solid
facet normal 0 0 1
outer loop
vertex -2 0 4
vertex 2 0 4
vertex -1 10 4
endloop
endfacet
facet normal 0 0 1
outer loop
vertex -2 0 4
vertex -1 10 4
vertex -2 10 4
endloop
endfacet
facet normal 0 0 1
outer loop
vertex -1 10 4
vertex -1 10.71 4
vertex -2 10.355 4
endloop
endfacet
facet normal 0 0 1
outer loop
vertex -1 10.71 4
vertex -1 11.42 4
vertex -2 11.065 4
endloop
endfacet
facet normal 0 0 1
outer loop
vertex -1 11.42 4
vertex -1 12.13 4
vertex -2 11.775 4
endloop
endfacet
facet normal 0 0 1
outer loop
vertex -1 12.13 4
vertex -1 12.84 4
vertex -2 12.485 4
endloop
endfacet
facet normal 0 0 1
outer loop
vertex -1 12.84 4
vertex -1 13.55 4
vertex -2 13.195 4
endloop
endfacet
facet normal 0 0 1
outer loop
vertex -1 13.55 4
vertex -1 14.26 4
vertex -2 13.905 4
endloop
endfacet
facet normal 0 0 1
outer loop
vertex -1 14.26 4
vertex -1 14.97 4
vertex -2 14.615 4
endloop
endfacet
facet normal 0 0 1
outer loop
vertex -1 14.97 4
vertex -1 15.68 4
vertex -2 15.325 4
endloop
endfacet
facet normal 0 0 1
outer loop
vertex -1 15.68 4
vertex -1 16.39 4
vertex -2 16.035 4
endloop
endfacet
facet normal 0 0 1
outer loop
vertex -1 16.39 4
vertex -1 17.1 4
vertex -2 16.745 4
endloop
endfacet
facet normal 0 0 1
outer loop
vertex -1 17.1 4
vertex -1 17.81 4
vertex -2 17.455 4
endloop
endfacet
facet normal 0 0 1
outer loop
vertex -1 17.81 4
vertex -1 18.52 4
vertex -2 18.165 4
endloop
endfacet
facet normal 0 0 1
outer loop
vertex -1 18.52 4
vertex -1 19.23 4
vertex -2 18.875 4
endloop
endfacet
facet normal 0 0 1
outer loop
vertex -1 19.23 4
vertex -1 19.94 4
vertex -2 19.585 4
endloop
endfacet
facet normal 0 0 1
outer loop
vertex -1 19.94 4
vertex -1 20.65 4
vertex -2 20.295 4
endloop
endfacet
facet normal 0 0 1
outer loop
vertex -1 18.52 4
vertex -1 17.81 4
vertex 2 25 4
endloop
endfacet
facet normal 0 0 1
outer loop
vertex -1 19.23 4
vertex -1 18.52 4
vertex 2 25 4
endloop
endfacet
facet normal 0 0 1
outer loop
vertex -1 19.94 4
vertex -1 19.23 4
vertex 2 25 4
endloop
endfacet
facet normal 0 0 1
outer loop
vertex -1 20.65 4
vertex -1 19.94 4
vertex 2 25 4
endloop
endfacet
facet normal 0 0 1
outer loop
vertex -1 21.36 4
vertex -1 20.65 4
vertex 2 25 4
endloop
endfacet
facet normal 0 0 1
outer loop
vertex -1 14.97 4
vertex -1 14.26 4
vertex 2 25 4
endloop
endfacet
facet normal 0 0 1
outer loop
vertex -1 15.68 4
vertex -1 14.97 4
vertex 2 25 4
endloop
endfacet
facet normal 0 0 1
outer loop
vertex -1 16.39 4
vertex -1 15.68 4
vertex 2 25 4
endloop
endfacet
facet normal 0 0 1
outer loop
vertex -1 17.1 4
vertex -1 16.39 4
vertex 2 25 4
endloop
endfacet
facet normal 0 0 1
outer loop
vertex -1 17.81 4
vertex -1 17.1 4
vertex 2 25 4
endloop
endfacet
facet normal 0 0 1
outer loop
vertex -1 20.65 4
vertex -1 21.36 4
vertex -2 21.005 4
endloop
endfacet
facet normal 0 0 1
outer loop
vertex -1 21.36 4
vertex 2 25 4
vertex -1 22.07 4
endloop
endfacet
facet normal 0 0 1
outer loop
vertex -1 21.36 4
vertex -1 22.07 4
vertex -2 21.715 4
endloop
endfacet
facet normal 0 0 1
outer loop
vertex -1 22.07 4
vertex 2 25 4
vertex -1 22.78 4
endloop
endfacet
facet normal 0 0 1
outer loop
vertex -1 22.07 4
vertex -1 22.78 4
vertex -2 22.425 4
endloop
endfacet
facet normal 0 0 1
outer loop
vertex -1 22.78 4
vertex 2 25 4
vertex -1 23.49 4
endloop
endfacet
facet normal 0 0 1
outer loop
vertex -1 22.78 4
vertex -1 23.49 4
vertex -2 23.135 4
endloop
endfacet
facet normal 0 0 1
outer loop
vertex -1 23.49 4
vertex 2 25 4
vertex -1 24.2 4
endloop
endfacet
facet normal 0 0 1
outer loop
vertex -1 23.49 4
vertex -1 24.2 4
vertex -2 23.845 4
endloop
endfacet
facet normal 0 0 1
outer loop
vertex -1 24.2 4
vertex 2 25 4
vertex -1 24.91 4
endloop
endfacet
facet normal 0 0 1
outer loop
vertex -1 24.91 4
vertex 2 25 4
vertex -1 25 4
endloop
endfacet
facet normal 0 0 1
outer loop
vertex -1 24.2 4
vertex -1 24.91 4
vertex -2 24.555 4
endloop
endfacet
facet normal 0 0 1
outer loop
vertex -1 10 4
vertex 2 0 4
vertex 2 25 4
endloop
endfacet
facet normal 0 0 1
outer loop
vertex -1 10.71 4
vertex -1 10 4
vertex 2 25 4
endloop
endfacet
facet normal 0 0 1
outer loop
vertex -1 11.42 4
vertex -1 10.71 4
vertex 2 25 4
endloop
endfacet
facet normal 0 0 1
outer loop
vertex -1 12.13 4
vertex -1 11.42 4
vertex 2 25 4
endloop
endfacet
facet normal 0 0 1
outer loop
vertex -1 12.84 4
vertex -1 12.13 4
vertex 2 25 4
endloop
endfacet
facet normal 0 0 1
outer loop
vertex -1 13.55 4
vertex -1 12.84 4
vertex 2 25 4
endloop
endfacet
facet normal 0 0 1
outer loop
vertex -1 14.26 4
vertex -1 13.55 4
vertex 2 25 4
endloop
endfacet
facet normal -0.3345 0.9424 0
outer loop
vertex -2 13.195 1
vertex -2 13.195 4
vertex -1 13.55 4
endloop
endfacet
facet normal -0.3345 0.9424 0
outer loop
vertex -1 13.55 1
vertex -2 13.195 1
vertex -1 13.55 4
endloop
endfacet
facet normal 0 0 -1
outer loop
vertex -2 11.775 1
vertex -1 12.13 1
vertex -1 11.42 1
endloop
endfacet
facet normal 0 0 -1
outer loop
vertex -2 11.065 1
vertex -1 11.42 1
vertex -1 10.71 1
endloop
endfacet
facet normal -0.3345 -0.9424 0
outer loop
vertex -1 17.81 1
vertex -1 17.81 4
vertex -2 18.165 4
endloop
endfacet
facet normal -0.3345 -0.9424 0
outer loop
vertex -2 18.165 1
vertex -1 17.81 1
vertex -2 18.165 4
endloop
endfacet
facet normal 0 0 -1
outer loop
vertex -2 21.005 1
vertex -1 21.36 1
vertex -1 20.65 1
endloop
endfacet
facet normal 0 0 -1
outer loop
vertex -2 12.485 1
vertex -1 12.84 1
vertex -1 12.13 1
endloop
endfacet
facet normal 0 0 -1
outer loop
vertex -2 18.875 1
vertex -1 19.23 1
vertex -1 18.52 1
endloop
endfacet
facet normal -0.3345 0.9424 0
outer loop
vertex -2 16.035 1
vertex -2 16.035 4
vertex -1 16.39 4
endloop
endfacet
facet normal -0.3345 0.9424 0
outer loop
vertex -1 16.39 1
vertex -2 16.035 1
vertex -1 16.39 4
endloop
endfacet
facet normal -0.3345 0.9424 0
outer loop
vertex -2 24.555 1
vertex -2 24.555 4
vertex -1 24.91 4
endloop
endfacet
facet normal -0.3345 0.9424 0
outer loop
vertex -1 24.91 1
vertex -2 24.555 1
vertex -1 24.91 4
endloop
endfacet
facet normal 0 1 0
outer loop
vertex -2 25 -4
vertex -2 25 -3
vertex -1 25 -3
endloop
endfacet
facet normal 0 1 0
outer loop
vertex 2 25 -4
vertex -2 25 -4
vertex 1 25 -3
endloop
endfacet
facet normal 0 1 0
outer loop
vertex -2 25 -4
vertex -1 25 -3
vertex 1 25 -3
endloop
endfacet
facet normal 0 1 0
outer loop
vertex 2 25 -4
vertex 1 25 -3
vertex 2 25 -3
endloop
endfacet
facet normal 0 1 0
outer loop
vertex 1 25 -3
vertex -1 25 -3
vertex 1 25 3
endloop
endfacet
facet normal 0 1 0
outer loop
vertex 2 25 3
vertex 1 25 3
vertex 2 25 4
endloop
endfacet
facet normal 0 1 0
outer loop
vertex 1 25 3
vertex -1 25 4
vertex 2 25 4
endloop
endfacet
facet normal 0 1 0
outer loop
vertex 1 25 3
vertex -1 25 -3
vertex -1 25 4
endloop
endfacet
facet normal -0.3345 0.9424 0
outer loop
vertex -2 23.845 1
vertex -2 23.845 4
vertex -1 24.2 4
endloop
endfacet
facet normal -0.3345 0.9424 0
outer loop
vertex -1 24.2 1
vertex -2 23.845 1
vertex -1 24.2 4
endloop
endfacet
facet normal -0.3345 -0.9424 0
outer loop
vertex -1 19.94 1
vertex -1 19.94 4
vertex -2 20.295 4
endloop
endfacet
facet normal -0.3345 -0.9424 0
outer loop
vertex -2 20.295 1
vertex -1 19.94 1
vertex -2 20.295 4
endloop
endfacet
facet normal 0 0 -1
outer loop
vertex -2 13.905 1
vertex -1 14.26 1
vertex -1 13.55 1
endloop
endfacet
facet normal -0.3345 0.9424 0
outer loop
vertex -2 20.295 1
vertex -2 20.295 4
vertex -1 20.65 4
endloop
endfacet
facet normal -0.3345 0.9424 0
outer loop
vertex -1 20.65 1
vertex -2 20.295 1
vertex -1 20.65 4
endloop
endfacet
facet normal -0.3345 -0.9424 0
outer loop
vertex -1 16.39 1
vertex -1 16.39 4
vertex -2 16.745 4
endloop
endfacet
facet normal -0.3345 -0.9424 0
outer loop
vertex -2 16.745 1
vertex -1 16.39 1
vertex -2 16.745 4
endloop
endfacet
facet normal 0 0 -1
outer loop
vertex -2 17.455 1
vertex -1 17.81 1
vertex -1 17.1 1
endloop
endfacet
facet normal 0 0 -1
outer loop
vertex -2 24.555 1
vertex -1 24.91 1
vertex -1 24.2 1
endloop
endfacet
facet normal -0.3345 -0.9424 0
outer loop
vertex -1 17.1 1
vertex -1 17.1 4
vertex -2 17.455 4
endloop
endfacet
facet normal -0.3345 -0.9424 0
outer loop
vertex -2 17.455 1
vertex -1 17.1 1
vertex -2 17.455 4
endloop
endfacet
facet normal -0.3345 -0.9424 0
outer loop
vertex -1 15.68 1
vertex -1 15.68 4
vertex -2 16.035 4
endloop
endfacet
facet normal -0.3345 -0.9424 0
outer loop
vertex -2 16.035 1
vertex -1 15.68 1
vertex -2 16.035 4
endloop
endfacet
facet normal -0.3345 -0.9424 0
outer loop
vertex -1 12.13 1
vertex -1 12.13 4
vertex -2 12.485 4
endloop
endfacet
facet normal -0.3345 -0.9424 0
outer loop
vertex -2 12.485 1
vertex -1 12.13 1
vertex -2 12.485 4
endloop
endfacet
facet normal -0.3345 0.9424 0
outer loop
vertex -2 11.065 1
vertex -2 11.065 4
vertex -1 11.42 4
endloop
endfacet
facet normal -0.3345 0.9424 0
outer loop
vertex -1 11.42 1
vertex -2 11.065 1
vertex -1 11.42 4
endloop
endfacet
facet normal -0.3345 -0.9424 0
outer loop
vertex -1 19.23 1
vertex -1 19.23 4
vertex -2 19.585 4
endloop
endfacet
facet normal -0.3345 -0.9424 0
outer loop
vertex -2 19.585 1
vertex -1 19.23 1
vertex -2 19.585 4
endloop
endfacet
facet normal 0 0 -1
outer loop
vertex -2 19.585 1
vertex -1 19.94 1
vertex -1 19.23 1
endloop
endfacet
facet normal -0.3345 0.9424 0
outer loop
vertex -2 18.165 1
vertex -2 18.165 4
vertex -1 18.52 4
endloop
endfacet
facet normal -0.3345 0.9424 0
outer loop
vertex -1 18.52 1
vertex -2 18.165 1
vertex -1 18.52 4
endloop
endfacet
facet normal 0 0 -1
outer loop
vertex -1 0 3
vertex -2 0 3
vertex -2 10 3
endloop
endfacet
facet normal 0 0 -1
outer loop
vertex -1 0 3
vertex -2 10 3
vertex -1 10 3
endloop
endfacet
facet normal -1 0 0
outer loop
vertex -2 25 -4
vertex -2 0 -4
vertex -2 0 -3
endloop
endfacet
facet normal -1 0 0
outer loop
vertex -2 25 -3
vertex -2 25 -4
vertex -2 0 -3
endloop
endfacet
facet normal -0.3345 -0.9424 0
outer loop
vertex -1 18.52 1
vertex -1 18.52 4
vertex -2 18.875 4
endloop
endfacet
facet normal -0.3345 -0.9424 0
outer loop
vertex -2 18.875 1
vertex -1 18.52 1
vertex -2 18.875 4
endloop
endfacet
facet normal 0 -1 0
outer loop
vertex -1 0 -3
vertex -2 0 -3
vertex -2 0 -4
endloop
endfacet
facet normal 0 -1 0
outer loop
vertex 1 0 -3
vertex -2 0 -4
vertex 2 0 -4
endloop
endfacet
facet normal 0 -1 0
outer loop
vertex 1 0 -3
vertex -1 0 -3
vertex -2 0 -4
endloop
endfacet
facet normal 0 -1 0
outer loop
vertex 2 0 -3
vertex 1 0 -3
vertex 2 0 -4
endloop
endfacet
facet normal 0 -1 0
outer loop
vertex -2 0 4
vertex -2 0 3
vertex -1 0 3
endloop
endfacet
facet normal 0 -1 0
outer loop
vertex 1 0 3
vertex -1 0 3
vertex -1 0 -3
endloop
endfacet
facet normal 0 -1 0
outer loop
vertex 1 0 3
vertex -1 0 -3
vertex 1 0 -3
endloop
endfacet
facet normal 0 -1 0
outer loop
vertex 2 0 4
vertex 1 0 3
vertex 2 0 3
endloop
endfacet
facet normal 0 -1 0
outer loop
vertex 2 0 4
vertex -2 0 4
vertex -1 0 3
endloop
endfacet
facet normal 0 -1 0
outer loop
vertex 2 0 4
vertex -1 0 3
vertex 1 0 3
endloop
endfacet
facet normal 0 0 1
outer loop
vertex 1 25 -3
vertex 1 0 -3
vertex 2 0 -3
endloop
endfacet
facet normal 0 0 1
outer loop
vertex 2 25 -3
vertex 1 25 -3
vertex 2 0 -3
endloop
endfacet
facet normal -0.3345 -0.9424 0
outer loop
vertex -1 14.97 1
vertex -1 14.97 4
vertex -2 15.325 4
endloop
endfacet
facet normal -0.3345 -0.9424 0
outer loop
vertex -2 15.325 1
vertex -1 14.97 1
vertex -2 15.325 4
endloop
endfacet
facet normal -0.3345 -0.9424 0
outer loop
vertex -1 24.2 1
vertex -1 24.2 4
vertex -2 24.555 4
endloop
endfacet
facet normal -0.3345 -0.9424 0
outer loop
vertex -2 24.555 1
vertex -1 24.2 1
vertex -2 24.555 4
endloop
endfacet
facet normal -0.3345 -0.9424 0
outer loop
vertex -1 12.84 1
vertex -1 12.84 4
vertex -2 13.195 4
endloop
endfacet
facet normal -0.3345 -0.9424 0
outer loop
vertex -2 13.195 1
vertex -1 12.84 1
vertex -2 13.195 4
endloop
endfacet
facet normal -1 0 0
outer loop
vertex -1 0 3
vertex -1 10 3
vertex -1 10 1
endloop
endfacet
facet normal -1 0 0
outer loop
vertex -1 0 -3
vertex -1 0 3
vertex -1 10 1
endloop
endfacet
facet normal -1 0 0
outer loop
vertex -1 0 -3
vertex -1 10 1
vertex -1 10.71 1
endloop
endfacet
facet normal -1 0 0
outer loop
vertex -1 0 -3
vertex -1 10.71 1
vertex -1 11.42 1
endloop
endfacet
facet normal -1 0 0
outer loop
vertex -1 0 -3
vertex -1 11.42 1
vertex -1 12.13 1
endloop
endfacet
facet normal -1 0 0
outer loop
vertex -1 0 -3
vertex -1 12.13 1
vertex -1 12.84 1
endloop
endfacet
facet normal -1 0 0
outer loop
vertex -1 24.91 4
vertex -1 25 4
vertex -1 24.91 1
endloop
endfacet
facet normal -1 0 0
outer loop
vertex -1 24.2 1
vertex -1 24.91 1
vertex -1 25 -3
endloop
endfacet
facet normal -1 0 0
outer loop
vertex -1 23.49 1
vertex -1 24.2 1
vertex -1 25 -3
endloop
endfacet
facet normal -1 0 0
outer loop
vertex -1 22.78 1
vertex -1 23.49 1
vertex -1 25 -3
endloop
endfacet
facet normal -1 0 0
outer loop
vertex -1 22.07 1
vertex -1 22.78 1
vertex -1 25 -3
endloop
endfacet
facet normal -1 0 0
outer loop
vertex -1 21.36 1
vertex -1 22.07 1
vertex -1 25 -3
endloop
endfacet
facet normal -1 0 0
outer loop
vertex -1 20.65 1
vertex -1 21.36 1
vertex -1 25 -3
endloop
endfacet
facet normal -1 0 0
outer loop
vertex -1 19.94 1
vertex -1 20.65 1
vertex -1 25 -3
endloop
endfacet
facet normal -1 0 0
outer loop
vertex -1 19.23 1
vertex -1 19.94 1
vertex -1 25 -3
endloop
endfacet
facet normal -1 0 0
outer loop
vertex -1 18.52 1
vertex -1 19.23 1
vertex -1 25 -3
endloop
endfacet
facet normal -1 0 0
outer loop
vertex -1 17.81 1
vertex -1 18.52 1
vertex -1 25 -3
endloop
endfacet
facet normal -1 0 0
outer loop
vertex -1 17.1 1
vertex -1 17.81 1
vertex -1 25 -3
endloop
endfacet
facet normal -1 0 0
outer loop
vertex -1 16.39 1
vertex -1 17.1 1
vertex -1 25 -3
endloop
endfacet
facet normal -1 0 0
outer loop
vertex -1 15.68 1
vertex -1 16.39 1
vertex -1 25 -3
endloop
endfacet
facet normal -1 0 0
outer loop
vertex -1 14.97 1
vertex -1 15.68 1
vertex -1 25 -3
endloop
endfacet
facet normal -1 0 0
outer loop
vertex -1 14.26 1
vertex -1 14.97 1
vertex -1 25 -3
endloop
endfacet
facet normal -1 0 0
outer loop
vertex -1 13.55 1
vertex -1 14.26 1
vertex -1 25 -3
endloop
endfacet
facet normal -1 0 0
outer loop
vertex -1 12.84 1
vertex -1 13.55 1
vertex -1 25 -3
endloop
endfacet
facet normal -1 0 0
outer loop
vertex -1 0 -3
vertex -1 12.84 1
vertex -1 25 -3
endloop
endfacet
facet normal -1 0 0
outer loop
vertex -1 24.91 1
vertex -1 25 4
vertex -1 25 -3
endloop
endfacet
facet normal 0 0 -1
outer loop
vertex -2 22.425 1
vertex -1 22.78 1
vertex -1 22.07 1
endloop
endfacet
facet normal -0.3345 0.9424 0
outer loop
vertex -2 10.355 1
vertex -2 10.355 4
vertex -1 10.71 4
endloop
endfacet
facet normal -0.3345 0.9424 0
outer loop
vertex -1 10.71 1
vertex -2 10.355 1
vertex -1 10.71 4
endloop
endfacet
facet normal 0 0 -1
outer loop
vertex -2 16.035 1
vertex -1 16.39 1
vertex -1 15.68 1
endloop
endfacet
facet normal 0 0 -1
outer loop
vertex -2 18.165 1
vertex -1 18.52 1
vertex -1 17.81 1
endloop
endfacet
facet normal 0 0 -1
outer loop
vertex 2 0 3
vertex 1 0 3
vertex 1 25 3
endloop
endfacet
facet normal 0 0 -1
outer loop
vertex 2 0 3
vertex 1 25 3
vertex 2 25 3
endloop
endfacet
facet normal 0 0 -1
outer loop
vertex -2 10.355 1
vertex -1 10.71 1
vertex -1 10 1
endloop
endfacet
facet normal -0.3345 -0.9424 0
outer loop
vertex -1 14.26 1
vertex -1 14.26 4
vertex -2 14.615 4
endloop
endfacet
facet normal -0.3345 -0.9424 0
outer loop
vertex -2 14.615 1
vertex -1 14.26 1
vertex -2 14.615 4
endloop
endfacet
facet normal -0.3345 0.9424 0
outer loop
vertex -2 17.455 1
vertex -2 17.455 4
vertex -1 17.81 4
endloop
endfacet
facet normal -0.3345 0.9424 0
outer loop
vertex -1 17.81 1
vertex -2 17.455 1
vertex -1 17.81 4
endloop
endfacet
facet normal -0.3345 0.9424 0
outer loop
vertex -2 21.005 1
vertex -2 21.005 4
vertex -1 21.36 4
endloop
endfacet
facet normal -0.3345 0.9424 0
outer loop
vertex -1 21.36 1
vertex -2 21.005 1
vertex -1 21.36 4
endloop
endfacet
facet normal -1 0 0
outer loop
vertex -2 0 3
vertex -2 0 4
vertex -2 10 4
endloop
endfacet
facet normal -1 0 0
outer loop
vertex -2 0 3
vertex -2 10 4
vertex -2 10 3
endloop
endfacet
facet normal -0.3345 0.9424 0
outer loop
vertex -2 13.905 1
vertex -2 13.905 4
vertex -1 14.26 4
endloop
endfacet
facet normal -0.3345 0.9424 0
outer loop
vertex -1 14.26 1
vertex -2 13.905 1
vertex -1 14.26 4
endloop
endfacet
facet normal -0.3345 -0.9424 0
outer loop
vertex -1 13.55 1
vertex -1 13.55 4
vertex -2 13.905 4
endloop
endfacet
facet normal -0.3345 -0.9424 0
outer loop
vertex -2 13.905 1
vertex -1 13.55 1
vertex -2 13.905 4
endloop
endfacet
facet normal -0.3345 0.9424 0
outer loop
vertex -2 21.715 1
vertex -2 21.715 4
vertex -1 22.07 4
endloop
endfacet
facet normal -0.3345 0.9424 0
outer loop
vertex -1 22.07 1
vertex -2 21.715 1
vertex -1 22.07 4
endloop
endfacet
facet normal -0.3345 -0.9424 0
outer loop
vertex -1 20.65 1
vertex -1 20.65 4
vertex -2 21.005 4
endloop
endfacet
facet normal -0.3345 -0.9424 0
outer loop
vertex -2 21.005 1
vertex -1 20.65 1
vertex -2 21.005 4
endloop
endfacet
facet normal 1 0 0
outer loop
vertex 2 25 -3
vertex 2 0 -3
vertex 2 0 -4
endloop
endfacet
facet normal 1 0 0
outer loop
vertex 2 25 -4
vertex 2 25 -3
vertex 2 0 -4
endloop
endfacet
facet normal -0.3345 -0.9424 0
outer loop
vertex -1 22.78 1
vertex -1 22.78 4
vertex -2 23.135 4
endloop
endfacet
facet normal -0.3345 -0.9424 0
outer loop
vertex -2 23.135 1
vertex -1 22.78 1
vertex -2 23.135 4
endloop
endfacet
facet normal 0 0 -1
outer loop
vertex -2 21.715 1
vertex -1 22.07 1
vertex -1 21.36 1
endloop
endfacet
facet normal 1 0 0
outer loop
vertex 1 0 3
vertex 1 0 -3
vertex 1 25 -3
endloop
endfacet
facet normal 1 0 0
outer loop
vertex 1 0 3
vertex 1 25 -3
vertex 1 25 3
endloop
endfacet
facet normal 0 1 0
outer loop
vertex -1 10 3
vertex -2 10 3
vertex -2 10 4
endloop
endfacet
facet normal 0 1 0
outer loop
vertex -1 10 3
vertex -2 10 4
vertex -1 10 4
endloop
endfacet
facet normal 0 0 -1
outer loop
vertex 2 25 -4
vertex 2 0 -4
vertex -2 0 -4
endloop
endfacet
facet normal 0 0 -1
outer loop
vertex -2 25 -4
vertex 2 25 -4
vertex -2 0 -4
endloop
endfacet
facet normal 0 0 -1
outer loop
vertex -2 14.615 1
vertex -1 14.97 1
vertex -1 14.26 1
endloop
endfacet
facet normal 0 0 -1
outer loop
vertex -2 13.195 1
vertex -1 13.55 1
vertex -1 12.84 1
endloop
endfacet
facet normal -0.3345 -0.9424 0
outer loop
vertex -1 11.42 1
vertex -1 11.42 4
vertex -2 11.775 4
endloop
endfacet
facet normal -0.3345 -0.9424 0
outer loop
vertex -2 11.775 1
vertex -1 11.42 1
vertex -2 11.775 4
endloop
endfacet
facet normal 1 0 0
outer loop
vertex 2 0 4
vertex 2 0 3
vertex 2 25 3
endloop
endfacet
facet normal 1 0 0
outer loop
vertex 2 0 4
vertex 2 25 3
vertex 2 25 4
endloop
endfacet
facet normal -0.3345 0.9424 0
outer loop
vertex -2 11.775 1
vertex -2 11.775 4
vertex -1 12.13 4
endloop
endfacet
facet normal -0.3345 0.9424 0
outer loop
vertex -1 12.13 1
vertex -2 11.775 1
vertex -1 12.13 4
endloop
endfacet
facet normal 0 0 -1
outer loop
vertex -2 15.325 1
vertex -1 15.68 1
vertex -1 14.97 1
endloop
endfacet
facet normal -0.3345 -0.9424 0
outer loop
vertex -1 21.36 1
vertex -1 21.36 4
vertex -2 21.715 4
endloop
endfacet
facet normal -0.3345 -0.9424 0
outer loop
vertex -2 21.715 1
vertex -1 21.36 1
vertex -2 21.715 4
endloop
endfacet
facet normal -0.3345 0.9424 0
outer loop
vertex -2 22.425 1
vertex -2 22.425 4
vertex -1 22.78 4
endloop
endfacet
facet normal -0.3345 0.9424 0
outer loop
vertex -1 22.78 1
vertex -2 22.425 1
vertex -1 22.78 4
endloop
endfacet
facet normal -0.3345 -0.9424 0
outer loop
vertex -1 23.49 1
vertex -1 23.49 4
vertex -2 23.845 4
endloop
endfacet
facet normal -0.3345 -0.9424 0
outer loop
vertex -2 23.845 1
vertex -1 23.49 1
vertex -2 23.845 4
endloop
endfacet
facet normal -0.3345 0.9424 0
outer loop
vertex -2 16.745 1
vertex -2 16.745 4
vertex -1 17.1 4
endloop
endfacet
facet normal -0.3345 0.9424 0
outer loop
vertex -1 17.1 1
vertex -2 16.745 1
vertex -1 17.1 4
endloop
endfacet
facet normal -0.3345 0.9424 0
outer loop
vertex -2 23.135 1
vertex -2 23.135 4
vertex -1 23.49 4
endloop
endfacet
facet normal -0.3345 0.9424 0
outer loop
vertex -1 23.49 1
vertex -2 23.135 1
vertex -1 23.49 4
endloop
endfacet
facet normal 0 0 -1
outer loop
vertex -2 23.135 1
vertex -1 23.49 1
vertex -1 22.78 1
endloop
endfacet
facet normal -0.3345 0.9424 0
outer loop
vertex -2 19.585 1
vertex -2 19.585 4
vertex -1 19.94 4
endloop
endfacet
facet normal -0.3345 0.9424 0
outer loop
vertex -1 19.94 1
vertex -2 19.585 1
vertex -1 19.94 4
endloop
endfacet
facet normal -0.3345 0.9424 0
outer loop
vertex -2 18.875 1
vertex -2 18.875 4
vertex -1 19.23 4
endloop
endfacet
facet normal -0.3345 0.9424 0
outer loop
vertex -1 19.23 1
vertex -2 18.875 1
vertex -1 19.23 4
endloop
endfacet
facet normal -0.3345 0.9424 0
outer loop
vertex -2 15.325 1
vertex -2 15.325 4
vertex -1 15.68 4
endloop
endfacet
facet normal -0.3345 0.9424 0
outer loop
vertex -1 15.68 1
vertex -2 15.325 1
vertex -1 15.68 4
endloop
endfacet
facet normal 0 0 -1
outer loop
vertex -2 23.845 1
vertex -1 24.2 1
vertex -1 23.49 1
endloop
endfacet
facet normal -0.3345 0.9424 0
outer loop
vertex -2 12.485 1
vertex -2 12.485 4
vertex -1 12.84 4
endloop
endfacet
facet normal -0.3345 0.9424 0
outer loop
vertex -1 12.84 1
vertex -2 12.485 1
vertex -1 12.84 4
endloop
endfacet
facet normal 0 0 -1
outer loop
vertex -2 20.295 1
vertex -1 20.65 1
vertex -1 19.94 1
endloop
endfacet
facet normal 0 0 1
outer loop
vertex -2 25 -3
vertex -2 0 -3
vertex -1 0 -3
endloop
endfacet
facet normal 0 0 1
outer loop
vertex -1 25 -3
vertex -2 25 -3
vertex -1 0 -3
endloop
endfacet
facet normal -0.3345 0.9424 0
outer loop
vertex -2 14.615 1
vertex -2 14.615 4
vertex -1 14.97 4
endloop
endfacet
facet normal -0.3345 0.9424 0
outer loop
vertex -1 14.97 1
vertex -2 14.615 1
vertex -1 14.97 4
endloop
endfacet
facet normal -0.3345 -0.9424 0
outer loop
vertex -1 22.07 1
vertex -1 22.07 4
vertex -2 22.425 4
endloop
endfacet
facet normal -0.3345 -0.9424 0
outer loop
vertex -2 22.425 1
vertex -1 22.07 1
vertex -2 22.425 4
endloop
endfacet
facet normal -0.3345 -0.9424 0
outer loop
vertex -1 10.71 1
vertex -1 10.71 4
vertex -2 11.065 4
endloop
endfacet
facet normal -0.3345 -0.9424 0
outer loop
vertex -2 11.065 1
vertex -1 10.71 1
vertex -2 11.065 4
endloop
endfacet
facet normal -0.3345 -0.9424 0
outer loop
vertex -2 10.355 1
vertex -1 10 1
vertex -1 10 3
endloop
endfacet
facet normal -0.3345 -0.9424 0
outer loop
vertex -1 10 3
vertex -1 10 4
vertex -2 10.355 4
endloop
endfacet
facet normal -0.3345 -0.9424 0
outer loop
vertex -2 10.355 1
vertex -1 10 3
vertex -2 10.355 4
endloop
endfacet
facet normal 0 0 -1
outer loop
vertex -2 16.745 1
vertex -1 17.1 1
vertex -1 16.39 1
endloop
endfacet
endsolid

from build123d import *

# Parameters (mm, degrees)
BOSS_EXTRUDE1_DEPTH = 25
SKETCH2_W           = 1
SKETCH2_H           = 1
CUT_EXTRUDE1_DEPTH  = 15
BOSS_EXTRUDE2_DEPTH = 3
LPATTERN1_COUNT     = 21
LPATTERN1_PITCH     = 0.71


with BuildPart() as part:
    # Sketch1 → Boss-Extrude1 (new body)
    with BuildSketch(Plane(origin=(0, 0, 0), x_dir=(1, 0, 0), z_dir=(0, 1, 0))):
        Polygon((2, 4), (-2, 4), (-2, 3), (-1, 3), (-1, 0), (1, 0), (1, 3), (2, 3), align=None)
    boss_extrude1 = extrude(amount=BOSS_EXTRUDE1_DEPTH)

    # Mirror1: Boss-Extrude1 across plane
    add(boss_extrude1.mirror(Plane(origin=(-1, 25, 0), x_dir=(1, 0, 0), z_dir=(0, 0, -1))))

    # Sketch2 → Cut-Extrude1 (cut)
    with BuildSketch(Plane(origin=(0, 25, 0), x_dir=(1, 0, 0), z_dir=(0, 1, 0))):
        with Locations((-1.5, -3.5)):
            Rectangle(SKETCH2_W, SKETCH2_H)
    extrude(amount=-CUT_EXTRUDE1_DEPTH, mode=Mode.SUBTRACT)

    # Sketch3 → Boss-Extrude2 (add)
    with BuildSketch(Plane.XY.offset(4)):
        Polygon((-1, 10), (-2, 10.355), (-1, 10.71), align=None)
    boss_extrude2 = extrude(amount=-BOSS_EXTRUDE2_DEPTH)

    # LPattern1: Boss-Extrude2 ×21
    with Locations(*[(0, i * LPATTERN1_PITCH, 0) for i in range(1, LPATTERN1_COUNT)]):
        add(boss_extrude2)


solid = part.part
